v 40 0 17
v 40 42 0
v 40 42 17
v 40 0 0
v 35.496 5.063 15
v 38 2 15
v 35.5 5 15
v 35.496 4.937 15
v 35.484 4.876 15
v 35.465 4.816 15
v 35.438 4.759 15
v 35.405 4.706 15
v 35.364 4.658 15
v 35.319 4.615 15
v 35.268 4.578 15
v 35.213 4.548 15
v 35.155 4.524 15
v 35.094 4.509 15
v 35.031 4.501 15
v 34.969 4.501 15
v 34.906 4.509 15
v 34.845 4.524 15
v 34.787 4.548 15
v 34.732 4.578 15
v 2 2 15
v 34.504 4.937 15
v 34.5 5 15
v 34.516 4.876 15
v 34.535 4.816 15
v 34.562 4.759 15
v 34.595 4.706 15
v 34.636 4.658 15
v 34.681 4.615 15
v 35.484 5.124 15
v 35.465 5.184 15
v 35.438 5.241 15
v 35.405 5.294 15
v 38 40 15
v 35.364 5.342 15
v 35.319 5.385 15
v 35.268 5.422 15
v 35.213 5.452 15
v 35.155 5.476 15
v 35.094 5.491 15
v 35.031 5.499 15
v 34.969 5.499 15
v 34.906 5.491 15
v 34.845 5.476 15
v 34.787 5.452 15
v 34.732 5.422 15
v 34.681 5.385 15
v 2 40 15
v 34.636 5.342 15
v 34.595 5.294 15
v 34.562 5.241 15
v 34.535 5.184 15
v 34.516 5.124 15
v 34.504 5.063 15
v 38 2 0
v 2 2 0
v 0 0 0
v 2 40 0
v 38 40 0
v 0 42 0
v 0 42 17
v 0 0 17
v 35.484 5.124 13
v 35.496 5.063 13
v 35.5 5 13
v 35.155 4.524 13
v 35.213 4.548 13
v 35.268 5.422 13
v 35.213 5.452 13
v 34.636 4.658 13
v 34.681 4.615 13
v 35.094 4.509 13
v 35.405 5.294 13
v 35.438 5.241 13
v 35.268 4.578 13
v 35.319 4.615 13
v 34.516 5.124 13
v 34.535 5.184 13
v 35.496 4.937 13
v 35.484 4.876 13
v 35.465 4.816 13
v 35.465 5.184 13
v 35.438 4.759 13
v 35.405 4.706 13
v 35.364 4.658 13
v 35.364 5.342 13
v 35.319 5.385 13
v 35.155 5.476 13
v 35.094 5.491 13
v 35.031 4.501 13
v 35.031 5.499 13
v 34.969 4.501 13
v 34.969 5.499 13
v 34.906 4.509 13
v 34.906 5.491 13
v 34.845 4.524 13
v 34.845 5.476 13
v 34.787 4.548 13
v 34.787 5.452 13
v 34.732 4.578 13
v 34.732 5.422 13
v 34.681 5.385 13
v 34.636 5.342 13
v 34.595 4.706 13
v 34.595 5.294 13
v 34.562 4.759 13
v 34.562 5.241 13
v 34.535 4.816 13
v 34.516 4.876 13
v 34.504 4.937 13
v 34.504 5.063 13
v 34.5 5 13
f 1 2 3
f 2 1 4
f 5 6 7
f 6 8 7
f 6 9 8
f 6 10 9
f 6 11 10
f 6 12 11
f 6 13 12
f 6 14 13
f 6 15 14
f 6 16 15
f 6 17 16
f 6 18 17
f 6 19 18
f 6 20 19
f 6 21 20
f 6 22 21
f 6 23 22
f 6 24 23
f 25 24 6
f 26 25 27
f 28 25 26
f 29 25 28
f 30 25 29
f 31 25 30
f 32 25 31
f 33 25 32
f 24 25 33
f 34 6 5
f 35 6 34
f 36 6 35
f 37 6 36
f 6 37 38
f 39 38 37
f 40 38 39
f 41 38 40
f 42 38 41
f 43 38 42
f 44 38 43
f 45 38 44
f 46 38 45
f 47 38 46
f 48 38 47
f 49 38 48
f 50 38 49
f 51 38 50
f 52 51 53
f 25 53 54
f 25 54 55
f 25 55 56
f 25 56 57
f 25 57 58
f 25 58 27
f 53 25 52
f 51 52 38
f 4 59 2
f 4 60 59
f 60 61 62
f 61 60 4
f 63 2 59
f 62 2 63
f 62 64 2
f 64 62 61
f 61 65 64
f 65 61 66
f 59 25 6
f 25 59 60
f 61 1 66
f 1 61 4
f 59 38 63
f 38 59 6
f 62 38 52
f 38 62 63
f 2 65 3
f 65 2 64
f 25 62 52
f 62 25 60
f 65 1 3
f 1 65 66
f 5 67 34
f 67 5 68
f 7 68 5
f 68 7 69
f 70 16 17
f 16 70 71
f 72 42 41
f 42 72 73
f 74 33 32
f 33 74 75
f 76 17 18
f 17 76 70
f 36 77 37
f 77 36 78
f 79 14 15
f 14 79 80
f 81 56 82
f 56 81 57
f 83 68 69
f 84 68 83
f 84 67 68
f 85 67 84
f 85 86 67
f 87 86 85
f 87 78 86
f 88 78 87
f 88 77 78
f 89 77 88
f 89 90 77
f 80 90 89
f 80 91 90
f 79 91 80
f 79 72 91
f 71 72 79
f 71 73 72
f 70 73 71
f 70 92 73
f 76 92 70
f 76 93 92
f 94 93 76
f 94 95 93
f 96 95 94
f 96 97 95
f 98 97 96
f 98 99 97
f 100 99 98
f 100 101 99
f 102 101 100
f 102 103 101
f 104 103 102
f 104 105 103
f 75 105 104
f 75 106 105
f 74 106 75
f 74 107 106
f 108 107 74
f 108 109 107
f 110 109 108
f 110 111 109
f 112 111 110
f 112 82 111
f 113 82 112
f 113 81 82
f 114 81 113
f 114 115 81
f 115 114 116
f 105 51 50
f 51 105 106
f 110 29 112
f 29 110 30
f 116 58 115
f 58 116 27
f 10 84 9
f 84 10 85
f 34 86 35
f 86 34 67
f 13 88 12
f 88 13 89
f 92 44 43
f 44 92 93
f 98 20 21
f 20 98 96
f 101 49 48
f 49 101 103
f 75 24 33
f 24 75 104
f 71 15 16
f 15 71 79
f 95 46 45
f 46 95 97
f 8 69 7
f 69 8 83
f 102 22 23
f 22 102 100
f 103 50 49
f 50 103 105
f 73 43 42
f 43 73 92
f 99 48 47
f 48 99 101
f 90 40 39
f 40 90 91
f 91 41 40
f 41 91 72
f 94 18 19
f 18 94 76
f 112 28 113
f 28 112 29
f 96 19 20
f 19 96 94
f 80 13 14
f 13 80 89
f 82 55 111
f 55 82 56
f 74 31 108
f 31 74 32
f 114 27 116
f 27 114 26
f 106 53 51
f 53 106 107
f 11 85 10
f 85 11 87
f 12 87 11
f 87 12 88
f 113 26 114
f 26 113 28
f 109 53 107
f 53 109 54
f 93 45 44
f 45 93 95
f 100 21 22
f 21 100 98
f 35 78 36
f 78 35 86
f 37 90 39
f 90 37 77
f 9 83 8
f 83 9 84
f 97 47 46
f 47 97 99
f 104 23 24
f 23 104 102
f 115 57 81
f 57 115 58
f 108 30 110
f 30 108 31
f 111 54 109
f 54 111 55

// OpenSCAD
$fn=50;
length=40;
width=2;
height=15;
module wall() {
cube([length,width,height]);
}
wall();
translate([length,0,0])
    rotate([0,0,90])
        wall();
translate([0,length,0])
    wall();

translate([width,0,0])
    rotate([0,0,90])
        wall();
// ceiling
translate([0,0,height])
    cube([length,length+width,width]);
// laser module
translate([35,5,height-2])
    cylinder(h=4,r=.5);
